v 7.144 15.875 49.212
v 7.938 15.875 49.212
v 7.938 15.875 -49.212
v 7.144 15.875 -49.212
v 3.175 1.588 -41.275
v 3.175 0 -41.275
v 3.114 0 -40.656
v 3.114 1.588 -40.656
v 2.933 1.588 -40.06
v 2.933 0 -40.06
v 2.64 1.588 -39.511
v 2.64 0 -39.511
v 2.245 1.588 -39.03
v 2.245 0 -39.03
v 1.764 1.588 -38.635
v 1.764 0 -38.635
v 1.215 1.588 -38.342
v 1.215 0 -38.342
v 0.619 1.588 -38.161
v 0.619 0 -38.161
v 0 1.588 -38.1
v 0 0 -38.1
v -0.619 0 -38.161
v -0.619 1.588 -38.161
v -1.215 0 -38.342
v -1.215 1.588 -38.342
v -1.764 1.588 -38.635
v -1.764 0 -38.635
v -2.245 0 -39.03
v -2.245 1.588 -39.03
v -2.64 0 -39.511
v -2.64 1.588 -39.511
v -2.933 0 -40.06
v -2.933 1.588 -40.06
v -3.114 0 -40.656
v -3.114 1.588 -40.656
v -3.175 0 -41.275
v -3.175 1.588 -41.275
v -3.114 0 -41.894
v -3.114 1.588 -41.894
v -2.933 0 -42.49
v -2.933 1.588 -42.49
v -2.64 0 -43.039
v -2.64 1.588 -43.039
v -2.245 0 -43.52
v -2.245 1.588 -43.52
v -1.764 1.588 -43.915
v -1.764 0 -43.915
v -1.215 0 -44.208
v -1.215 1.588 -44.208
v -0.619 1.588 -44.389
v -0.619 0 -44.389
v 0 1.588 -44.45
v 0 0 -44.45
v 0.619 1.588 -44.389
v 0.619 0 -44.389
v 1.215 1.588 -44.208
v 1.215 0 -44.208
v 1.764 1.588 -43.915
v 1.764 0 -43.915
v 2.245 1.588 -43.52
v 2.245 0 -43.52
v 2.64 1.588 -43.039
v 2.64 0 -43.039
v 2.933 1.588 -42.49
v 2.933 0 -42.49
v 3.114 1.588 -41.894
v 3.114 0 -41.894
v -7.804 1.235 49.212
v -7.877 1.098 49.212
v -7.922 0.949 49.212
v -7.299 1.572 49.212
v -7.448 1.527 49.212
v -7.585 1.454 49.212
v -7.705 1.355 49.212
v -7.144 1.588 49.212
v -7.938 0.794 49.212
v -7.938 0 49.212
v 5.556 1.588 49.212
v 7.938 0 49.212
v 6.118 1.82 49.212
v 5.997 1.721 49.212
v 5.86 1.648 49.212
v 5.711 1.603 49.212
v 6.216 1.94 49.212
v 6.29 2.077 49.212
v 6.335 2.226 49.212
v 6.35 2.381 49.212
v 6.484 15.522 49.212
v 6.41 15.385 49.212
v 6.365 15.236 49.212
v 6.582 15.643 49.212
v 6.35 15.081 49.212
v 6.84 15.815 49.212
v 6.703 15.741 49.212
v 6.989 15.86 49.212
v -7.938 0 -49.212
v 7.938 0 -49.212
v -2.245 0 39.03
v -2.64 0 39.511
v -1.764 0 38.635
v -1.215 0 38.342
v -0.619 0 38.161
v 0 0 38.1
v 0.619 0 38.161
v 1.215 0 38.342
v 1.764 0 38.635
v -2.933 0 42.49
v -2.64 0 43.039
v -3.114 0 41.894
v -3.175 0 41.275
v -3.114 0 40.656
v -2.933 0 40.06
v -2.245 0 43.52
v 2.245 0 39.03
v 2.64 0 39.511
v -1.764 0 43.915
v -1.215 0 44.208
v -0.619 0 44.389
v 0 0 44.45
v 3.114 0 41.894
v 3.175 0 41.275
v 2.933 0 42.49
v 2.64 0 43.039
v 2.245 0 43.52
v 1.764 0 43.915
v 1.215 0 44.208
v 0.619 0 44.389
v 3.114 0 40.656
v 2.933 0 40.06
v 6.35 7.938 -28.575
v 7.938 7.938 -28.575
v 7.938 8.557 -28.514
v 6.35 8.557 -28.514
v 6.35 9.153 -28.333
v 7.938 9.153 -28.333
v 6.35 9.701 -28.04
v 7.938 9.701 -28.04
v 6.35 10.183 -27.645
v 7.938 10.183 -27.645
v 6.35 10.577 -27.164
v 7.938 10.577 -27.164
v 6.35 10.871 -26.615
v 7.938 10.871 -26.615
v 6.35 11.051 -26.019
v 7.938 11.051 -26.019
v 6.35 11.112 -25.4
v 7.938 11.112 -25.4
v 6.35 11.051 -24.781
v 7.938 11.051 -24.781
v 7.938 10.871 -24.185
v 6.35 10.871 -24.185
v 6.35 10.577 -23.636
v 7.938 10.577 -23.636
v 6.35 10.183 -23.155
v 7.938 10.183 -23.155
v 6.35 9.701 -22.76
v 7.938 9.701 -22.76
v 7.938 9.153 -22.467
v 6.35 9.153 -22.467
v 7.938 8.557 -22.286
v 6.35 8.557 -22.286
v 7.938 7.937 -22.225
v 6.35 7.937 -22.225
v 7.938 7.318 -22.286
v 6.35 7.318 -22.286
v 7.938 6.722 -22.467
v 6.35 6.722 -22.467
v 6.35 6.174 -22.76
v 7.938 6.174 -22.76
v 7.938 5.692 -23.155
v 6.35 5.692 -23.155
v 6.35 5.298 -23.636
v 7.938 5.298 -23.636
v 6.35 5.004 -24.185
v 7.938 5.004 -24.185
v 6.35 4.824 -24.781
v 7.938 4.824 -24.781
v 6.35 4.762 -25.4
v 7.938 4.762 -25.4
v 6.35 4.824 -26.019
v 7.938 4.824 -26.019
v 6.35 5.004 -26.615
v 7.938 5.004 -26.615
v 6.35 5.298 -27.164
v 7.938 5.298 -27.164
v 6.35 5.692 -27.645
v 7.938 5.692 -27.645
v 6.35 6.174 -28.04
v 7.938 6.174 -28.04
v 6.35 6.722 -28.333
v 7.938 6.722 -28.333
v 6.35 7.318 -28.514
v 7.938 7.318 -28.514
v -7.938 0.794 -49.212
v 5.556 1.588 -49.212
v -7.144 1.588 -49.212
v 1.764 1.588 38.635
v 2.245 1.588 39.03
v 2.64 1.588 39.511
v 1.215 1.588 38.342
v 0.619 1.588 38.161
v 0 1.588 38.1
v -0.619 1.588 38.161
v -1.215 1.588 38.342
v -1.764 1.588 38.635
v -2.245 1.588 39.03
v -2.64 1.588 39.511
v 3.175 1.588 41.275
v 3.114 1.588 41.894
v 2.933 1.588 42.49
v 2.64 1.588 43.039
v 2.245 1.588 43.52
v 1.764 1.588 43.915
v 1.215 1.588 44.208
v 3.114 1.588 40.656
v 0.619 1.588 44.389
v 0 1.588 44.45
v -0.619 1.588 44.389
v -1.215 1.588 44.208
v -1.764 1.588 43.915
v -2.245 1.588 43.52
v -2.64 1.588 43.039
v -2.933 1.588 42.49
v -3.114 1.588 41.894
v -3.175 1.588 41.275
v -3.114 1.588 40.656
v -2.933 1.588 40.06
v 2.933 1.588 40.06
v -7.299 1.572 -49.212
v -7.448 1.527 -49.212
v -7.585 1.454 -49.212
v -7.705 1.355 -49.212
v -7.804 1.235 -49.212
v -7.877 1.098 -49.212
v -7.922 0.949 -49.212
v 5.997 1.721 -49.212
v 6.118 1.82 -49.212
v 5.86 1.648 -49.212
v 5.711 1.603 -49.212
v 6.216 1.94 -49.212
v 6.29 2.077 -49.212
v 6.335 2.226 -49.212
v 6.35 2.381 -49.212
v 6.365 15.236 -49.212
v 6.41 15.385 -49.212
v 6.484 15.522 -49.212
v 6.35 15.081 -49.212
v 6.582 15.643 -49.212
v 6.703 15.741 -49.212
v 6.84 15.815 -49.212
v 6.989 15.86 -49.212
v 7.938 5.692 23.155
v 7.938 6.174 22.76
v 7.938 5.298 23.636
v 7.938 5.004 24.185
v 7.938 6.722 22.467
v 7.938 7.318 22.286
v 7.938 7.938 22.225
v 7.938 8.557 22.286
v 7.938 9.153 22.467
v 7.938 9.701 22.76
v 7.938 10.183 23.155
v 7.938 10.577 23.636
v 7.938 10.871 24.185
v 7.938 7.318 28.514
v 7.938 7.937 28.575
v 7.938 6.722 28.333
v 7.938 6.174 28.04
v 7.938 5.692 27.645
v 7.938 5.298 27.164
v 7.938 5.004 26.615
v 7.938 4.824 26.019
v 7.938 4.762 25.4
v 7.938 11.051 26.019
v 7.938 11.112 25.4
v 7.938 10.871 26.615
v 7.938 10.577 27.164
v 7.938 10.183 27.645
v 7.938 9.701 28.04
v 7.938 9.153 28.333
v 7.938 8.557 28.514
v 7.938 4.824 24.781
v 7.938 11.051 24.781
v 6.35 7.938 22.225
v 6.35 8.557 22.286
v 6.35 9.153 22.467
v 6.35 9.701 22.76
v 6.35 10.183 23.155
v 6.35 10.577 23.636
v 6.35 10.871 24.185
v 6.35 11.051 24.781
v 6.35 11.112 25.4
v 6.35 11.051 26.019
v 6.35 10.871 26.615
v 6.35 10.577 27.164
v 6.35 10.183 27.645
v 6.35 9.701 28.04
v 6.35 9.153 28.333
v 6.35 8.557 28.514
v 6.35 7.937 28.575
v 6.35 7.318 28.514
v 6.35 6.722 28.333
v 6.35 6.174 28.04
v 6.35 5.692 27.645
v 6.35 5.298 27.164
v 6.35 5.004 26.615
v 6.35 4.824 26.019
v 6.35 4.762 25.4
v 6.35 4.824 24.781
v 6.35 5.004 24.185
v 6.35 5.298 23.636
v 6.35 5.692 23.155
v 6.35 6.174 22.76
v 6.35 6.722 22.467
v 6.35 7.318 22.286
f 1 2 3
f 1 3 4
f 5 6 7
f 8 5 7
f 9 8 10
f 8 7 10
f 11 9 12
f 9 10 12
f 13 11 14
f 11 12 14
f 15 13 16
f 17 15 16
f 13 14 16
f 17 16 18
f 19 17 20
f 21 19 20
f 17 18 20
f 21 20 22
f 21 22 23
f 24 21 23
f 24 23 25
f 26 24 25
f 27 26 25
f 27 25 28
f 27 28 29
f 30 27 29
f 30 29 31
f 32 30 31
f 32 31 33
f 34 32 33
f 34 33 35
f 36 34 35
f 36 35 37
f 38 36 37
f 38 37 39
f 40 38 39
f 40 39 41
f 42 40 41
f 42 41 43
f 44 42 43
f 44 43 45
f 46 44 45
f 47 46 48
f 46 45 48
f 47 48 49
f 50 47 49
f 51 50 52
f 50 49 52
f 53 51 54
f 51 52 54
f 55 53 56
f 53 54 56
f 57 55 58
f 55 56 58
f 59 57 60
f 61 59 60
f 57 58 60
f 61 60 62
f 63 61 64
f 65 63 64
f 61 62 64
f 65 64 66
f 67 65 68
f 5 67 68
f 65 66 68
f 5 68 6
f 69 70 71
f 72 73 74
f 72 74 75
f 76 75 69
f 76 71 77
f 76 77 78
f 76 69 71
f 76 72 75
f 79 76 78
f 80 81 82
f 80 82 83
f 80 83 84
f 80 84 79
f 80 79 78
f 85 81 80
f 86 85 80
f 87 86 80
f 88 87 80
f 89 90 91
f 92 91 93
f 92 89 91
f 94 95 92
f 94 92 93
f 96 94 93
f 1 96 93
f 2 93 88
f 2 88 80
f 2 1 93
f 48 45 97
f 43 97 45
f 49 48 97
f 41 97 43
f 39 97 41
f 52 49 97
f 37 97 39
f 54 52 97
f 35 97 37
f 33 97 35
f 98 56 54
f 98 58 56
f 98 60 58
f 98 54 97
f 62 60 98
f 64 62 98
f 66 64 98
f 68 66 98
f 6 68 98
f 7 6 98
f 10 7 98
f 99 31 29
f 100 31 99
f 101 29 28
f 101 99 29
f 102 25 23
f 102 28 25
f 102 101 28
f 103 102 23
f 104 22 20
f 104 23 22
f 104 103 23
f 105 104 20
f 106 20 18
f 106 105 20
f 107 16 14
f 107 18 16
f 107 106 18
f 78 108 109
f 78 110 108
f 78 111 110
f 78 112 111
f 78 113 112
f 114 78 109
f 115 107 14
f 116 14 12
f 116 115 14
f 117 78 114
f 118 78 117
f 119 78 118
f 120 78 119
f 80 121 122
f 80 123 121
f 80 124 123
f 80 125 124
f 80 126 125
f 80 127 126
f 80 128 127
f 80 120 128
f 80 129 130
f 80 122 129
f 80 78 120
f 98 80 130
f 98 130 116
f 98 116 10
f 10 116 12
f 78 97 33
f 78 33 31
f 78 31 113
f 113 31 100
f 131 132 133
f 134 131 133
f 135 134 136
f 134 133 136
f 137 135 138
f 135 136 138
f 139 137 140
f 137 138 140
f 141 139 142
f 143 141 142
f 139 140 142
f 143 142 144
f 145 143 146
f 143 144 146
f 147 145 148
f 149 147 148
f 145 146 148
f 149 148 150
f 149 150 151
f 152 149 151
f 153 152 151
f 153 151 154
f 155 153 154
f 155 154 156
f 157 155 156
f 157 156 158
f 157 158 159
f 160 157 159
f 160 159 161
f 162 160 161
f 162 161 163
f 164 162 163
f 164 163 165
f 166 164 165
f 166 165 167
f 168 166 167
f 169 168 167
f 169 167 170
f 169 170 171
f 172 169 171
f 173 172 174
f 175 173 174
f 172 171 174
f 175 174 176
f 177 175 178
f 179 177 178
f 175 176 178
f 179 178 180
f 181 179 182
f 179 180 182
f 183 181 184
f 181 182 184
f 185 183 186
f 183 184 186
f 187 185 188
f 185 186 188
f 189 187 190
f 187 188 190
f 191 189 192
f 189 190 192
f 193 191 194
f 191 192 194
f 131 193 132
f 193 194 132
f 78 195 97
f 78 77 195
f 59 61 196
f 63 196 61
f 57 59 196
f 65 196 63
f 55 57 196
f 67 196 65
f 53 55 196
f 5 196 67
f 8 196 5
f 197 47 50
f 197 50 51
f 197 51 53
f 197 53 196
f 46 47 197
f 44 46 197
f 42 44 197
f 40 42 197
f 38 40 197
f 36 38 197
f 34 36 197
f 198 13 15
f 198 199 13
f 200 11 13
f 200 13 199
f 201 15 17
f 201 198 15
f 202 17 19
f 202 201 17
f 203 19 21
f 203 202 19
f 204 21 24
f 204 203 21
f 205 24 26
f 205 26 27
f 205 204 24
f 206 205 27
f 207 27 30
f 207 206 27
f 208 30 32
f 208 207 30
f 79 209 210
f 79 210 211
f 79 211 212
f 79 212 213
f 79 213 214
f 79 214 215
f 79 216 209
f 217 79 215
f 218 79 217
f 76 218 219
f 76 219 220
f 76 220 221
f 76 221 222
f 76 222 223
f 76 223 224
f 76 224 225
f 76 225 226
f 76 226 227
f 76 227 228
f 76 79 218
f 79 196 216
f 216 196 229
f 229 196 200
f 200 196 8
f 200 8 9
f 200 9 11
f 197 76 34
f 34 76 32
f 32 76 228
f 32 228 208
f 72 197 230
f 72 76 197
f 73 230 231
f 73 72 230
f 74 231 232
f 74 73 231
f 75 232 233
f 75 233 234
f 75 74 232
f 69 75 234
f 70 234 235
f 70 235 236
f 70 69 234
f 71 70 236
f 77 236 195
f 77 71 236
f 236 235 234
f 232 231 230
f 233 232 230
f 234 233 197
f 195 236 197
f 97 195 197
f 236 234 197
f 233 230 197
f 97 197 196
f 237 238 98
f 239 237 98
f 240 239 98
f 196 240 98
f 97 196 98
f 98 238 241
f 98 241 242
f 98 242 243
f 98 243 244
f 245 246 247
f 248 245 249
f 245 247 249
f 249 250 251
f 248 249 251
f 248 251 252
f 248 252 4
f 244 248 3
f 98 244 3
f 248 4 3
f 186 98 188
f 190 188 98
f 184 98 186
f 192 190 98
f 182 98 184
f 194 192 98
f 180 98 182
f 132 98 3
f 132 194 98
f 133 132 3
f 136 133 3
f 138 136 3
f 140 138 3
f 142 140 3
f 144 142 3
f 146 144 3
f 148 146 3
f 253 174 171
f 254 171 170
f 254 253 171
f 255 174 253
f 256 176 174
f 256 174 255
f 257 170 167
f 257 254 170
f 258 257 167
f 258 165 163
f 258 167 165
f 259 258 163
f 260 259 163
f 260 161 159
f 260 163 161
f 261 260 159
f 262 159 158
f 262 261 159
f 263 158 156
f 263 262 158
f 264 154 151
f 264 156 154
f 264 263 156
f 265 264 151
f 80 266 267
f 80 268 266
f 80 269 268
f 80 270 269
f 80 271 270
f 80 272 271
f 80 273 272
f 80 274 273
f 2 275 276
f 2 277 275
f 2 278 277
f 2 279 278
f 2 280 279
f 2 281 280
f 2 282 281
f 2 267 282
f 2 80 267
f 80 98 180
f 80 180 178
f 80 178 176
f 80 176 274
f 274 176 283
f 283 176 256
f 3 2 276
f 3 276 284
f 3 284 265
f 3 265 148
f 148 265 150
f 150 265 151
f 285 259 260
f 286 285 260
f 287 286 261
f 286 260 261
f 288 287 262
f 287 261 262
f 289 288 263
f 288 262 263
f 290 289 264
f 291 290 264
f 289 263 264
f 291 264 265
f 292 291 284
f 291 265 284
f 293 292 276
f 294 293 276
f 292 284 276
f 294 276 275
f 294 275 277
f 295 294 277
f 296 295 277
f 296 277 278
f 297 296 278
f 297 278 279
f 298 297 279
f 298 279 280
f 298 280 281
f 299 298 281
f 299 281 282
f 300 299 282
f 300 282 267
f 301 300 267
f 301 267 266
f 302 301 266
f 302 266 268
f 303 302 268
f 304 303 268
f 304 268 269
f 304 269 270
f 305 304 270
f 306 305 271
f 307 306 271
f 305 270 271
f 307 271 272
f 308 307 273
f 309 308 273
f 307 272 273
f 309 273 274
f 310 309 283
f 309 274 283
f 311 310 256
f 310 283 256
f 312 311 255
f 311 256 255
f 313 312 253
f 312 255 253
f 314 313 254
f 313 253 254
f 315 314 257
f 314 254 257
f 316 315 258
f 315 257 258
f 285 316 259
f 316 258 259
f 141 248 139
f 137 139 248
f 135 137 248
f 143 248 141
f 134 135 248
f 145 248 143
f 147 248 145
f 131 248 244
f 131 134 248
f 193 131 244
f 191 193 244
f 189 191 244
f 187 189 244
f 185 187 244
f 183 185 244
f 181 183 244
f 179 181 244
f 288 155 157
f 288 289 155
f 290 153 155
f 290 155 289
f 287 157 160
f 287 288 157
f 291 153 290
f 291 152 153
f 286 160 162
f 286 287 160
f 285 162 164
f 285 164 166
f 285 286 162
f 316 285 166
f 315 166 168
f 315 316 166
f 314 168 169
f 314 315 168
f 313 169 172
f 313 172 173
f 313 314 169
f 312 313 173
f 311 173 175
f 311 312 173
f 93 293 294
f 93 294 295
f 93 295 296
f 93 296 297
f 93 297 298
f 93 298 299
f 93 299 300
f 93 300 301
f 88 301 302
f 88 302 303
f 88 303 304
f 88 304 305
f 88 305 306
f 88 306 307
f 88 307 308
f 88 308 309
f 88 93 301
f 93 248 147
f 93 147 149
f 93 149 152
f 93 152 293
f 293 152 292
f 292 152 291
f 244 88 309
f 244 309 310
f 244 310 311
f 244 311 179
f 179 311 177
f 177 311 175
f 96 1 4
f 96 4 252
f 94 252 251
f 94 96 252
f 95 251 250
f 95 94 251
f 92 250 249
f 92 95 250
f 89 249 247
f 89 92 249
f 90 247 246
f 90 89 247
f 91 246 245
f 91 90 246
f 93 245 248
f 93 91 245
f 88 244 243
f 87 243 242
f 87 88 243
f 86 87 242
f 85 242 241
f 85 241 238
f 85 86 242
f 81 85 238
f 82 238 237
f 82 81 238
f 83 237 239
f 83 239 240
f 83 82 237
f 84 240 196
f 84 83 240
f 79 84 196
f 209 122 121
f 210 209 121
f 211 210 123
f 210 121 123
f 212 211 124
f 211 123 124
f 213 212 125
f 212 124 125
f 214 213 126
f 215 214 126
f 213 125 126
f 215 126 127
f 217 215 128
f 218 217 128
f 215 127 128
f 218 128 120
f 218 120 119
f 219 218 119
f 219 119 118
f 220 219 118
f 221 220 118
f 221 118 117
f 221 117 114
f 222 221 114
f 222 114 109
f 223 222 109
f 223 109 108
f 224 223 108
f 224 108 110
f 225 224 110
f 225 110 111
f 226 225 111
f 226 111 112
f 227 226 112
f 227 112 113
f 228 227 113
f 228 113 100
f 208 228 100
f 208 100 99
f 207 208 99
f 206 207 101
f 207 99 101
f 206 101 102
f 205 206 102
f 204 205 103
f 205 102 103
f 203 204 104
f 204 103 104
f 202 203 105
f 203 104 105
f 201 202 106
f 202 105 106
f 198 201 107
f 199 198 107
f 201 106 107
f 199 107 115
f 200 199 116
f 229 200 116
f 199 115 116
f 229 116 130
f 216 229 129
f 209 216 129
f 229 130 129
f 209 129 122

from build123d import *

# Parameters (mm, degrees)
BOSS_EXTRUDE1_DEPTH = 49.2125
SKETCH3_R           = 3.175
CUT_EXTRUDE1_DEPTH  = 16.875
CUT_EXTRUDE2_REACH  = 17.875
SKETCH4_R           = 3.175


with BuildPart() as part:
    # Sketch2 → Boss-Extrude1 (new body, symmetric)
    with BuildSketch(Plane.XY):
        with BuildLine():
            Line((-7.9375, 0), (7.9375, 0))
            Line((7.9375, 0), (7.9375, 15.875))
            Line((7.9375, 15.875), (7.14375, 15.875))
            ThreePointArc((7.14375, 15.875), (6.582483992, 15.642516008), (6.35, 15.08125))
            Line((6.35, 15.08125), (6.35, 2.38125))
            ThreePointArc((6.35, 2.38125), (6.117516008, 1.819983992), (5.55625, 1.5875))
            Line((5.55625, 1.5875), (-7.14375, 1.5875))
            ThreePointArc((-7.14375, 1.5875), (-7.705016008, 1.355016008), (-7.9375, 0.79375))
            Line((-7.9375, 0.79375), (-7.9375, 0))
        make_face()
    extrude(amount=BOSS_EXTRUDE1_DEPTH, both=True)

    # Sketch3 → Cut-Extrude1 (cut, through all)
    with BuildSketch(Plane(origin=(7.9375, 0, 0), x_dir=(0, 0, -1), z_dir=(1, 0, 0))):
        with Locations((-25.4, 7.9375)):
            Circle(SKETCH3_R)
        with Locations((25.4, 7.9375)):
            Circle(SKETCH3_R)
    extrude(amount=-CUT_EXTRUDE1_DEPTH, mode=Mode.SUBTRACT)

    # Sketch4 → Cut-Extrude2 (cut, up to next)
    with BuildSketch(Plane.XZ, mode=Mode.PRIVATE) as cut_extrude2_sk1:
        with Locations((0, -41.275)):
            Circle(SKETCH4_R)
    cut_extrude2_tool1 = extrude(cut_extrude2_sk1.sketch, amount=-CUT_EXTRUDE2_REACH, mode=Mode.PRIVATE) & part.part
    add(cut_extrude2_tool1.solids().sort_by_distance((0, 0, -41.275))[0], mode=Mode.SUBTRACT)
    # Sketch4 → Cut-Extrude2 (cut, up to next)
    with BuildSketch(Plane.XZ, mode=Mode.PRIVATE) as cut_extrude2_sk2:
        with Locations((0, 41.275)):
            Circle(SKETCH4_R)
    cut_extrude2_tool2 = extrude(cut_extrude2_sk2.sketch, amount=-CUT_EXTRUDE2_REACH, mode=Mode.PRIVATE) & part.part
    add(cut_extrude2_tool2.solids().sort_by_distance((0, 0, 41.275))[0], mode=Mode.SUBTRACT)


solid = part.part
